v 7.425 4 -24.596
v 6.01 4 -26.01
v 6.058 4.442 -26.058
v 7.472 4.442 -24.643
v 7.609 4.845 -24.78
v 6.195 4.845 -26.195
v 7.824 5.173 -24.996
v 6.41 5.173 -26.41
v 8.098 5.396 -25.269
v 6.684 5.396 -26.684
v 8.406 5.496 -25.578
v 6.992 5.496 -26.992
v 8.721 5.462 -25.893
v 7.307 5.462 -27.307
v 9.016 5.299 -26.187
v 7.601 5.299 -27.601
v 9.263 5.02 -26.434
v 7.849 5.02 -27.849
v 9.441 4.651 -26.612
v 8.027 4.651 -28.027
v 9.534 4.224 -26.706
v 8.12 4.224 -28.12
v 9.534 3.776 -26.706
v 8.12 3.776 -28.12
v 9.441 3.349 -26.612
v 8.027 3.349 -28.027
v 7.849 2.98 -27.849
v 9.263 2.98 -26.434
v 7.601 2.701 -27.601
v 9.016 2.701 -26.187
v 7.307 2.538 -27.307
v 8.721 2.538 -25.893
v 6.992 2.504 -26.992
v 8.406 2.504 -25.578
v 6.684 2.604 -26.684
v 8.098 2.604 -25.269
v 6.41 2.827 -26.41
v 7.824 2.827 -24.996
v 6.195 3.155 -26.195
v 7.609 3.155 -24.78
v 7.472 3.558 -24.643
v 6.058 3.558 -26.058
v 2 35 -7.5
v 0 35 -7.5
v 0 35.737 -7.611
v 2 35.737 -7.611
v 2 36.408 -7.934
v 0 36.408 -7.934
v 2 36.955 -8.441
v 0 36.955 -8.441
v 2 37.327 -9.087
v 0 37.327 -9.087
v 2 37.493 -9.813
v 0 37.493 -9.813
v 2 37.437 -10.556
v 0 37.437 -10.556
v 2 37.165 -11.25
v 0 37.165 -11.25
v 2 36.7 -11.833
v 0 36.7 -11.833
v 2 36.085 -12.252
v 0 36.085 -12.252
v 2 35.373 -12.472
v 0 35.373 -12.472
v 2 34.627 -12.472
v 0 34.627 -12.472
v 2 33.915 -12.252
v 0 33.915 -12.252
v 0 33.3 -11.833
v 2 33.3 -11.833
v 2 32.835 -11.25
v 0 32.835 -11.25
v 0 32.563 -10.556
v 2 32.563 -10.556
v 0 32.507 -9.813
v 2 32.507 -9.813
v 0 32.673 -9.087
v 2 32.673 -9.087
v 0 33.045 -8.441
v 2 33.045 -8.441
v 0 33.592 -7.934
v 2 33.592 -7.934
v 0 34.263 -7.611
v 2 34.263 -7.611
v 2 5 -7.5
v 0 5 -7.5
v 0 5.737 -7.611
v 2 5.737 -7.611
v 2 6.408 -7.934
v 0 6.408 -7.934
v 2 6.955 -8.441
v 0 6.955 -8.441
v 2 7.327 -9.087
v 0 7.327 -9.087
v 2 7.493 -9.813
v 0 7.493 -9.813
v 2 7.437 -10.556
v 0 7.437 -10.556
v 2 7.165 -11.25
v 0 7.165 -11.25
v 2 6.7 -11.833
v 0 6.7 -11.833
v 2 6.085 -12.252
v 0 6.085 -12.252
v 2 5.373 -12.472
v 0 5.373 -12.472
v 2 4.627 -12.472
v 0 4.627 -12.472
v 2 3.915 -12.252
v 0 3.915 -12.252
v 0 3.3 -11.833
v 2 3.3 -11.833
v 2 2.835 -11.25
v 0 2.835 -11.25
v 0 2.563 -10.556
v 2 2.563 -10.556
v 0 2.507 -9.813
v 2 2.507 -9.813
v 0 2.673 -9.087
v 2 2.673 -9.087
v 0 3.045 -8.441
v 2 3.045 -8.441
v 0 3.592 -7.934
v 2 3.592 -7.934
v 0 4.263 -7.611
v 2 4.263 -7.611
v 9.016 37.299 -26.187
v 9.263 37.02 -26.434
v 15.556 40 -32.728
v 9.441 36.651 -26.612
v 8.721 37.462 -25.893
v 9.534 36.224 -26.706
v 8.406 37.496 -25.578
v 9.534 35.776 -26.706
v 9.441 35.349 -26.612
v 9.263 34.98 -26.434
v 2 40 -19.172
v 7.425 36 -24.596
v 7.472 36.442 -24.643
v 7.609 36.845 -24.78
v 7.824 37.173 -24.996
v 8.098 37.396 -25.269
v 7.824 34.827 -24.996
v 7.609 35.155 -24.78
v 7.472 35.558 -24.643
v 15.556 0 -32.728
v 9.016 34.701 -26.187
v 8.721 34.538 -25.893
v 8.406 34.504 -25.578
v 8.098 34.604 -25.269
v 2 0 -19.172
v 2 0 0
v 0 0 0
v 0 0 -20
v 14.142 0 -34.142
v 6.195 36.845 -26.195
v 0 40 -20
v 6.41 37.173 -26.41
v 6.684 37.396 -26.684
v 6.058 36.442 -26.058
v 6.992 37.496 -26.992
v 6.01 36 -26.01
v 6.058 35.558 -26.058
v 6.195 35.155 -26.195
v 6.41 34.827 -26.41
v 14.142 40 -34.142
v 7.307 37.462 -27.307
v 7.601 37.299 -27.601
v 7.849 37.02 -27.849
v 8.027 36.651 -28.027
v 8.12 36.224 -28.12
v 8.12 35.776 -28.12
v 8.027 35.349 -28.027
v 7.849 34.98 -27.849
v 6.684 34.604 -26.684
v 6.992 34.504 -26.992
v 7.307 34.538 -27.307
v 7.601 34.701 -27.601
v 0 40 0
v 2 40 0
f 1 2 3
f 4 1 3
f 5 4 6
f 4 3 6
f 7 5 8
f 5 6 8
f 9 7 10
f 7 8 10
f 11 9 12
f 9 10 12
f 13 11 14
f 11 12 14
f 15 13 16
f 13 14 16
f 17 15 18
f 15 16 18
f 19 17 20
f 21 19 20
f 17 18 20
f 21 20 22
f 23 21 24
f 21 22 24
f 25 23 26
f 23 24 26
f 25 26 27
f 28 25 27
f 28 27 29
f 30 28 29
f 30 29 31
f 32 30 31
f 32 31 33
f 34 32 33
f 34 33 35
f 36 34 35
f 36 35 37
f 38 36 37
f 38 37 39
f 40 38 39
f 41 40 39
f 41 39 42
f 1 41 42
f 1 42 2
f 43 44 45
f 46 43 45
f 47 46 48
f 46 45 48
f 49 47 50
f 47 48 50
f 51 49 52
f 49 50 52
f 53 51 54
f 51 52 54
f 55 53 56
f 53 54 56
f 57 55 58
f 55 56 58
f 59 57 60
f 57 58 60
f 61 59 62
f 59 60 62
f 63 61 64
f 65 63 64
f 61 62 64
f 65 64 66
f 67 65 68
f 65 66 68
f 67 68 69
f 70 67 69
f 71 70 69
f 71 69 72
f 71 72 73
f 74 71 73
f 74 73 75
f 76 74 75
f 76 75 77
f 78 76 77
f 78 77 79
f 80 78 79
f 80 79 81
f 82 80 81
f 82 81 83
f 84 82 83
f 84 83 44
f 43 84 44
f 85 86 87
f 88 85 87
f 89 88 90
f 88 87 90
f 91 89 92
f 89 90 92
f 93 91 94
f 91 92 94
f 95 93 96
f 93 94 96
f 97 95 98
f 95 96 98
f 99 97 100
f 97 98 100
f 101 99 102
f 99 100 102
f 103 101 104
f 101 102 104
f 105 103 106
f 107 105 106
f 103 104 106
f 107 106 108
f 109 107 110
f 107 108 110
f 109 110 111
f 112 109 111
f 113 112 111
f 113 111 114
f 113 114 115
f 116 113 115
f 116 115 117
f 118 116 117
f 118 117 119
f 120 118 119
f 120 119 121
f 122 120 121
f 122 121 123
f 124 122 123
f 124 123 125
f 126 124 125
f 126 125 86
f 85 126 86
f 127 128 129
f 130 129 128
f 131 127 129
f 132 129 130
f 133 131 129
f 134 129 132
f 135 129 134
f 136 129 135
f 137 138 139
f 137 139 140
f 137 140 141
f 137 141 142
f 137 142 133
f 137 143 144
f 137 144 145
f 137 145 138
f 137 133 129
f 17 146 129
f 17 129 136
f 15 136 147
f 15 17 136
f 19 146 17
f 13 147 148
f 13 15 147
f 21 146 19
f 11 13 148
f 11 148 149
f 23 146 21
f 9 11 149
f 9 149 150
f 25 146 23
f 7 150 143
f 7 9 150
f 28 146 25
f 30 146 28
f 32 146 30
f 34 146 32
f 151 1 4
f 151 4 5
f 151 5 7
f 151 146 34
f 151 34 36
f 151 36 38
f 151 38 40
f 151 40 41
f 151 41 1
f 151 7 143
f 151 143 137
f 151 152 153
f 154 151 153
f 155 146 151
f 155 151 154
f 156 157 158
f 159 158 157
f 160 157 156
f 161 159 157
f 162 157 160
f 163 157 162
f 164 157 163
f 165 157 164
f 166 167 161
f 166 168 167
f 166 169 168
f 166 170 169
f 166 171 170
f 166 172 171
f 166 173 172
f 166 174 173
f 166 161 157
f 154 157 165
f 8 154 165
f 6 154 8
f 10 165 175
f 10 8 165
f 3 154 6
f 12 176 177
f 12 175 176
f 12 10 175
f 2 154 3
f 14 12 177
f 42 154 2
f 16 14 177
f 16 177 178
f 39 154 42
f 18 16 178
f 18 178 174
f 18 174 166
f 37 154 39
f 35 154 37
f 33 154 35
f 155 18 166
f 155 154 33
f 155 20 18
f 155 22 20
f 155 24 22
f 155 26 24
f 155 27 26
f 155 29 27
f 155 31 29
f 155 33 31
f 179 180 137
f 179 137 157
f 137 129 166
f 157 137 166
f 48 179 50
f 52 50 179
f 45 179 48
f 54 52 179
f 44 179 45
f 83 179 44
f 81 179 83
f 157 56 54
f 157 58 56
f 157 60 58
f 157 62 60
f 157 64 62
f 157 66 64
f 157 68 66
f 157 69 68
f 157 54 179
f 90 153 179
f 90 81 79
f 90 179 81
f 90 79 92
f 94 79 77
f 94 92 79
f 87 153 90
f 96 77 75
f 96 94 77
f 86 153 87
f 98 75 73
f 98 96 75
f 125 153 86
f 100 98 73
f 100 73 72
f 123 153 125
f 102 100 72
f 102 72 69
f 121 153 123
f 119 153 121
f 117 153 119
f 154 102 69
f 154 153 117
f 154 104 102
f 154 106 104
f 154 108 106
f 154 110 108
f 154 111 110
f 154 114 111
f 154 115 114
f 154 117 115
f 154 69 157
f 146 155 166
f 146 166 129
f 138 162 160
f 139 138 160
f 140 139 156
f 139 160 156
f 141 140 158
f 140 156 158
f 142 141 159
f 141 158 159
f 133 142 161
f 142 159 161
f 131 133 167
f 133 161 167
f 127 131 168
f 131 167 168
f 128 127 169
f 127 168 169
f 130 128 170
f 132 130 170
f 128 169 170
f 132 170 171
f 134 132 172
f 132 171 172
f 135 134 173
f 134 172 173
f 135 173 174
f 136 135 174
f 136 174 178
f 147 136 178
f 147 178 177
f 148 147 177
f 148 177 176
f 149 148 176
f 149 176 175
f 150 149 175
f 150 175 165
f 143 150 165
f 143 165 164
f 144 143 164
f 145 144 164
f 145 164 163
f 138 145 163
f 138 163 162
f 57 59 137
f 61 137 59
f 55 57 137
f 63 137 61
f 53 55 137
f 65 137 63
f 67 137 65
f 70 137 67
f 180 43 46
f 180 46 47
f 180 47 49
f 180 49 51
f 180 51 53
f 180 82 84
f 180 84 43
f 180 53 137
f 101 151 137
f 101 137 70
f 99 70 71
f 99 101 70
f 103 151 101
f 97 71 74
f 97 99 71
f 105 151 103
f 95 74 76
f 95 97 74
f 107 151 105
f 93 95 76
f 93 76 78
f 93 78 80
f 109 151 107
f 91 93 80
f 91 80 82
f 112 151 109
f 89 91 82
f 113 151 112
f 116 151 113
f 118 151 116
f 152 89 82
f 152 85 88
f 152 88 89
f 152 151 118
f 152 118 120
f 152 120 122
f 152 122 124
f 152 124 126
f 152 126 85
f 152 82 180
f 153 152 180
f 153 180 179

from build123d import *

# Parameters (mm, degrees)
EXTRUSION1_DEPTH = 40
EXTRUSION2_REACH = 17.556
ESQUISSE3_R      = 2.5
EXTRUSION3_REACH = 27.142
ESQUISSE4_R      = 1.5


with BuildPart() as part:
    # Esquisse1 → Extrusion1 (new body)
    with BuildSketch(Plane(origin=(0, 0, 0), x_dir=(1, 0, 0), z_dir=(0, 1, 0))):
        Polygon((0, 0), (0, 20), (14.142135624, 34.142135624), (15.556349186, 32.727922061), (2, 19.171572875), (2, 0), align=None)
    extrude(amount=EXTRUSION1_DEPTH)

    # Esquisse3 → Extrusion2 (cut, up to next)
    with BuildSketch(Plane.ZY, mode=Mode.PRIVATE) as extrusion2_sk1:
        with Locations((-10, 5)):
            Circle(ESQUISSE3_R)
    extrusion2_tool1 = extrude(extrusion2_sk1.sketch, amount=-EXTRUSION2_REACH, mode=Mode.PRIVATE) & part.part
    add(extrusion2_tool1.solids().sort_by_distance((0, 5, -10))[0], mode=Mode.SUBTRACT)
    # Esquisse3 → Extrusion2 (cut, up to next)
    with BuildSketch(Plane.ZY, mode=Mode.PRIVATE) as extrusion2_sk2:
        with Locations((-10, 35)):
            Circle(ESQUISSE3_R)
    extrusion2_tool2 = extrude(extrusion2_sk2.sketch, amount=-EXTRUSION2_REACH, mode=Mode.PRIVATE) & part.part
    add(extrusion2_tool2.solids().sort_by_distance((0, 35, -10))[0], mode=Mode.SUBTRACT)

    # Esquisse4 → Extrusion3 (cut, up to next)
    with BuildSketch(Plane(origin=(-10, 0, -10), x_dir=(-0.707106781, 0, 0.707106781), z_dir=(-0.707106781, 0, -0.707106781)), mode=Mode.PRIVATE) as extrusion3_sk1:
        with Locations((-24.142135624, 36)):
            Circle(ESQUISSE4_R)
    extrusion3_tool1 = extrude(extrusion3_sk1.sketch, amount=-EXTRUSION3_REACH, mode=Mode.PRIVATE) & part.part
    add(extrusion3_tool1.solids().sort_by_distance((7.071068, 36, -27.071068))[0], mode=Mode.SUBTRACT)
    # Esquisse4 → Extrusion3 (cut, up to next)
    with BuildSketch(Plane(origin=(-10, 0, -10), x_dir=(-0.707106781, 0, 0.707106781), z_dir=(-0.707106781, 0, -0.707106781)), mode=Mode.PRIVATE) as extrusion3_sk2:
        with Locations((-24.142135624, 4)):
            Circle(ESQUISSE4_R)
    extrusion3_tool2 = extrude(extrusion3_sk2.sketch, amount=-EXTRUSION3_REACH, mode=Mode.PRIVATE) & part.part
    add(extrusion3_tool2.solids().sort_by_distance((7.071068, 4, -27.071068))[0], mode=Mode.SUBTRACT)


solid = part.part
